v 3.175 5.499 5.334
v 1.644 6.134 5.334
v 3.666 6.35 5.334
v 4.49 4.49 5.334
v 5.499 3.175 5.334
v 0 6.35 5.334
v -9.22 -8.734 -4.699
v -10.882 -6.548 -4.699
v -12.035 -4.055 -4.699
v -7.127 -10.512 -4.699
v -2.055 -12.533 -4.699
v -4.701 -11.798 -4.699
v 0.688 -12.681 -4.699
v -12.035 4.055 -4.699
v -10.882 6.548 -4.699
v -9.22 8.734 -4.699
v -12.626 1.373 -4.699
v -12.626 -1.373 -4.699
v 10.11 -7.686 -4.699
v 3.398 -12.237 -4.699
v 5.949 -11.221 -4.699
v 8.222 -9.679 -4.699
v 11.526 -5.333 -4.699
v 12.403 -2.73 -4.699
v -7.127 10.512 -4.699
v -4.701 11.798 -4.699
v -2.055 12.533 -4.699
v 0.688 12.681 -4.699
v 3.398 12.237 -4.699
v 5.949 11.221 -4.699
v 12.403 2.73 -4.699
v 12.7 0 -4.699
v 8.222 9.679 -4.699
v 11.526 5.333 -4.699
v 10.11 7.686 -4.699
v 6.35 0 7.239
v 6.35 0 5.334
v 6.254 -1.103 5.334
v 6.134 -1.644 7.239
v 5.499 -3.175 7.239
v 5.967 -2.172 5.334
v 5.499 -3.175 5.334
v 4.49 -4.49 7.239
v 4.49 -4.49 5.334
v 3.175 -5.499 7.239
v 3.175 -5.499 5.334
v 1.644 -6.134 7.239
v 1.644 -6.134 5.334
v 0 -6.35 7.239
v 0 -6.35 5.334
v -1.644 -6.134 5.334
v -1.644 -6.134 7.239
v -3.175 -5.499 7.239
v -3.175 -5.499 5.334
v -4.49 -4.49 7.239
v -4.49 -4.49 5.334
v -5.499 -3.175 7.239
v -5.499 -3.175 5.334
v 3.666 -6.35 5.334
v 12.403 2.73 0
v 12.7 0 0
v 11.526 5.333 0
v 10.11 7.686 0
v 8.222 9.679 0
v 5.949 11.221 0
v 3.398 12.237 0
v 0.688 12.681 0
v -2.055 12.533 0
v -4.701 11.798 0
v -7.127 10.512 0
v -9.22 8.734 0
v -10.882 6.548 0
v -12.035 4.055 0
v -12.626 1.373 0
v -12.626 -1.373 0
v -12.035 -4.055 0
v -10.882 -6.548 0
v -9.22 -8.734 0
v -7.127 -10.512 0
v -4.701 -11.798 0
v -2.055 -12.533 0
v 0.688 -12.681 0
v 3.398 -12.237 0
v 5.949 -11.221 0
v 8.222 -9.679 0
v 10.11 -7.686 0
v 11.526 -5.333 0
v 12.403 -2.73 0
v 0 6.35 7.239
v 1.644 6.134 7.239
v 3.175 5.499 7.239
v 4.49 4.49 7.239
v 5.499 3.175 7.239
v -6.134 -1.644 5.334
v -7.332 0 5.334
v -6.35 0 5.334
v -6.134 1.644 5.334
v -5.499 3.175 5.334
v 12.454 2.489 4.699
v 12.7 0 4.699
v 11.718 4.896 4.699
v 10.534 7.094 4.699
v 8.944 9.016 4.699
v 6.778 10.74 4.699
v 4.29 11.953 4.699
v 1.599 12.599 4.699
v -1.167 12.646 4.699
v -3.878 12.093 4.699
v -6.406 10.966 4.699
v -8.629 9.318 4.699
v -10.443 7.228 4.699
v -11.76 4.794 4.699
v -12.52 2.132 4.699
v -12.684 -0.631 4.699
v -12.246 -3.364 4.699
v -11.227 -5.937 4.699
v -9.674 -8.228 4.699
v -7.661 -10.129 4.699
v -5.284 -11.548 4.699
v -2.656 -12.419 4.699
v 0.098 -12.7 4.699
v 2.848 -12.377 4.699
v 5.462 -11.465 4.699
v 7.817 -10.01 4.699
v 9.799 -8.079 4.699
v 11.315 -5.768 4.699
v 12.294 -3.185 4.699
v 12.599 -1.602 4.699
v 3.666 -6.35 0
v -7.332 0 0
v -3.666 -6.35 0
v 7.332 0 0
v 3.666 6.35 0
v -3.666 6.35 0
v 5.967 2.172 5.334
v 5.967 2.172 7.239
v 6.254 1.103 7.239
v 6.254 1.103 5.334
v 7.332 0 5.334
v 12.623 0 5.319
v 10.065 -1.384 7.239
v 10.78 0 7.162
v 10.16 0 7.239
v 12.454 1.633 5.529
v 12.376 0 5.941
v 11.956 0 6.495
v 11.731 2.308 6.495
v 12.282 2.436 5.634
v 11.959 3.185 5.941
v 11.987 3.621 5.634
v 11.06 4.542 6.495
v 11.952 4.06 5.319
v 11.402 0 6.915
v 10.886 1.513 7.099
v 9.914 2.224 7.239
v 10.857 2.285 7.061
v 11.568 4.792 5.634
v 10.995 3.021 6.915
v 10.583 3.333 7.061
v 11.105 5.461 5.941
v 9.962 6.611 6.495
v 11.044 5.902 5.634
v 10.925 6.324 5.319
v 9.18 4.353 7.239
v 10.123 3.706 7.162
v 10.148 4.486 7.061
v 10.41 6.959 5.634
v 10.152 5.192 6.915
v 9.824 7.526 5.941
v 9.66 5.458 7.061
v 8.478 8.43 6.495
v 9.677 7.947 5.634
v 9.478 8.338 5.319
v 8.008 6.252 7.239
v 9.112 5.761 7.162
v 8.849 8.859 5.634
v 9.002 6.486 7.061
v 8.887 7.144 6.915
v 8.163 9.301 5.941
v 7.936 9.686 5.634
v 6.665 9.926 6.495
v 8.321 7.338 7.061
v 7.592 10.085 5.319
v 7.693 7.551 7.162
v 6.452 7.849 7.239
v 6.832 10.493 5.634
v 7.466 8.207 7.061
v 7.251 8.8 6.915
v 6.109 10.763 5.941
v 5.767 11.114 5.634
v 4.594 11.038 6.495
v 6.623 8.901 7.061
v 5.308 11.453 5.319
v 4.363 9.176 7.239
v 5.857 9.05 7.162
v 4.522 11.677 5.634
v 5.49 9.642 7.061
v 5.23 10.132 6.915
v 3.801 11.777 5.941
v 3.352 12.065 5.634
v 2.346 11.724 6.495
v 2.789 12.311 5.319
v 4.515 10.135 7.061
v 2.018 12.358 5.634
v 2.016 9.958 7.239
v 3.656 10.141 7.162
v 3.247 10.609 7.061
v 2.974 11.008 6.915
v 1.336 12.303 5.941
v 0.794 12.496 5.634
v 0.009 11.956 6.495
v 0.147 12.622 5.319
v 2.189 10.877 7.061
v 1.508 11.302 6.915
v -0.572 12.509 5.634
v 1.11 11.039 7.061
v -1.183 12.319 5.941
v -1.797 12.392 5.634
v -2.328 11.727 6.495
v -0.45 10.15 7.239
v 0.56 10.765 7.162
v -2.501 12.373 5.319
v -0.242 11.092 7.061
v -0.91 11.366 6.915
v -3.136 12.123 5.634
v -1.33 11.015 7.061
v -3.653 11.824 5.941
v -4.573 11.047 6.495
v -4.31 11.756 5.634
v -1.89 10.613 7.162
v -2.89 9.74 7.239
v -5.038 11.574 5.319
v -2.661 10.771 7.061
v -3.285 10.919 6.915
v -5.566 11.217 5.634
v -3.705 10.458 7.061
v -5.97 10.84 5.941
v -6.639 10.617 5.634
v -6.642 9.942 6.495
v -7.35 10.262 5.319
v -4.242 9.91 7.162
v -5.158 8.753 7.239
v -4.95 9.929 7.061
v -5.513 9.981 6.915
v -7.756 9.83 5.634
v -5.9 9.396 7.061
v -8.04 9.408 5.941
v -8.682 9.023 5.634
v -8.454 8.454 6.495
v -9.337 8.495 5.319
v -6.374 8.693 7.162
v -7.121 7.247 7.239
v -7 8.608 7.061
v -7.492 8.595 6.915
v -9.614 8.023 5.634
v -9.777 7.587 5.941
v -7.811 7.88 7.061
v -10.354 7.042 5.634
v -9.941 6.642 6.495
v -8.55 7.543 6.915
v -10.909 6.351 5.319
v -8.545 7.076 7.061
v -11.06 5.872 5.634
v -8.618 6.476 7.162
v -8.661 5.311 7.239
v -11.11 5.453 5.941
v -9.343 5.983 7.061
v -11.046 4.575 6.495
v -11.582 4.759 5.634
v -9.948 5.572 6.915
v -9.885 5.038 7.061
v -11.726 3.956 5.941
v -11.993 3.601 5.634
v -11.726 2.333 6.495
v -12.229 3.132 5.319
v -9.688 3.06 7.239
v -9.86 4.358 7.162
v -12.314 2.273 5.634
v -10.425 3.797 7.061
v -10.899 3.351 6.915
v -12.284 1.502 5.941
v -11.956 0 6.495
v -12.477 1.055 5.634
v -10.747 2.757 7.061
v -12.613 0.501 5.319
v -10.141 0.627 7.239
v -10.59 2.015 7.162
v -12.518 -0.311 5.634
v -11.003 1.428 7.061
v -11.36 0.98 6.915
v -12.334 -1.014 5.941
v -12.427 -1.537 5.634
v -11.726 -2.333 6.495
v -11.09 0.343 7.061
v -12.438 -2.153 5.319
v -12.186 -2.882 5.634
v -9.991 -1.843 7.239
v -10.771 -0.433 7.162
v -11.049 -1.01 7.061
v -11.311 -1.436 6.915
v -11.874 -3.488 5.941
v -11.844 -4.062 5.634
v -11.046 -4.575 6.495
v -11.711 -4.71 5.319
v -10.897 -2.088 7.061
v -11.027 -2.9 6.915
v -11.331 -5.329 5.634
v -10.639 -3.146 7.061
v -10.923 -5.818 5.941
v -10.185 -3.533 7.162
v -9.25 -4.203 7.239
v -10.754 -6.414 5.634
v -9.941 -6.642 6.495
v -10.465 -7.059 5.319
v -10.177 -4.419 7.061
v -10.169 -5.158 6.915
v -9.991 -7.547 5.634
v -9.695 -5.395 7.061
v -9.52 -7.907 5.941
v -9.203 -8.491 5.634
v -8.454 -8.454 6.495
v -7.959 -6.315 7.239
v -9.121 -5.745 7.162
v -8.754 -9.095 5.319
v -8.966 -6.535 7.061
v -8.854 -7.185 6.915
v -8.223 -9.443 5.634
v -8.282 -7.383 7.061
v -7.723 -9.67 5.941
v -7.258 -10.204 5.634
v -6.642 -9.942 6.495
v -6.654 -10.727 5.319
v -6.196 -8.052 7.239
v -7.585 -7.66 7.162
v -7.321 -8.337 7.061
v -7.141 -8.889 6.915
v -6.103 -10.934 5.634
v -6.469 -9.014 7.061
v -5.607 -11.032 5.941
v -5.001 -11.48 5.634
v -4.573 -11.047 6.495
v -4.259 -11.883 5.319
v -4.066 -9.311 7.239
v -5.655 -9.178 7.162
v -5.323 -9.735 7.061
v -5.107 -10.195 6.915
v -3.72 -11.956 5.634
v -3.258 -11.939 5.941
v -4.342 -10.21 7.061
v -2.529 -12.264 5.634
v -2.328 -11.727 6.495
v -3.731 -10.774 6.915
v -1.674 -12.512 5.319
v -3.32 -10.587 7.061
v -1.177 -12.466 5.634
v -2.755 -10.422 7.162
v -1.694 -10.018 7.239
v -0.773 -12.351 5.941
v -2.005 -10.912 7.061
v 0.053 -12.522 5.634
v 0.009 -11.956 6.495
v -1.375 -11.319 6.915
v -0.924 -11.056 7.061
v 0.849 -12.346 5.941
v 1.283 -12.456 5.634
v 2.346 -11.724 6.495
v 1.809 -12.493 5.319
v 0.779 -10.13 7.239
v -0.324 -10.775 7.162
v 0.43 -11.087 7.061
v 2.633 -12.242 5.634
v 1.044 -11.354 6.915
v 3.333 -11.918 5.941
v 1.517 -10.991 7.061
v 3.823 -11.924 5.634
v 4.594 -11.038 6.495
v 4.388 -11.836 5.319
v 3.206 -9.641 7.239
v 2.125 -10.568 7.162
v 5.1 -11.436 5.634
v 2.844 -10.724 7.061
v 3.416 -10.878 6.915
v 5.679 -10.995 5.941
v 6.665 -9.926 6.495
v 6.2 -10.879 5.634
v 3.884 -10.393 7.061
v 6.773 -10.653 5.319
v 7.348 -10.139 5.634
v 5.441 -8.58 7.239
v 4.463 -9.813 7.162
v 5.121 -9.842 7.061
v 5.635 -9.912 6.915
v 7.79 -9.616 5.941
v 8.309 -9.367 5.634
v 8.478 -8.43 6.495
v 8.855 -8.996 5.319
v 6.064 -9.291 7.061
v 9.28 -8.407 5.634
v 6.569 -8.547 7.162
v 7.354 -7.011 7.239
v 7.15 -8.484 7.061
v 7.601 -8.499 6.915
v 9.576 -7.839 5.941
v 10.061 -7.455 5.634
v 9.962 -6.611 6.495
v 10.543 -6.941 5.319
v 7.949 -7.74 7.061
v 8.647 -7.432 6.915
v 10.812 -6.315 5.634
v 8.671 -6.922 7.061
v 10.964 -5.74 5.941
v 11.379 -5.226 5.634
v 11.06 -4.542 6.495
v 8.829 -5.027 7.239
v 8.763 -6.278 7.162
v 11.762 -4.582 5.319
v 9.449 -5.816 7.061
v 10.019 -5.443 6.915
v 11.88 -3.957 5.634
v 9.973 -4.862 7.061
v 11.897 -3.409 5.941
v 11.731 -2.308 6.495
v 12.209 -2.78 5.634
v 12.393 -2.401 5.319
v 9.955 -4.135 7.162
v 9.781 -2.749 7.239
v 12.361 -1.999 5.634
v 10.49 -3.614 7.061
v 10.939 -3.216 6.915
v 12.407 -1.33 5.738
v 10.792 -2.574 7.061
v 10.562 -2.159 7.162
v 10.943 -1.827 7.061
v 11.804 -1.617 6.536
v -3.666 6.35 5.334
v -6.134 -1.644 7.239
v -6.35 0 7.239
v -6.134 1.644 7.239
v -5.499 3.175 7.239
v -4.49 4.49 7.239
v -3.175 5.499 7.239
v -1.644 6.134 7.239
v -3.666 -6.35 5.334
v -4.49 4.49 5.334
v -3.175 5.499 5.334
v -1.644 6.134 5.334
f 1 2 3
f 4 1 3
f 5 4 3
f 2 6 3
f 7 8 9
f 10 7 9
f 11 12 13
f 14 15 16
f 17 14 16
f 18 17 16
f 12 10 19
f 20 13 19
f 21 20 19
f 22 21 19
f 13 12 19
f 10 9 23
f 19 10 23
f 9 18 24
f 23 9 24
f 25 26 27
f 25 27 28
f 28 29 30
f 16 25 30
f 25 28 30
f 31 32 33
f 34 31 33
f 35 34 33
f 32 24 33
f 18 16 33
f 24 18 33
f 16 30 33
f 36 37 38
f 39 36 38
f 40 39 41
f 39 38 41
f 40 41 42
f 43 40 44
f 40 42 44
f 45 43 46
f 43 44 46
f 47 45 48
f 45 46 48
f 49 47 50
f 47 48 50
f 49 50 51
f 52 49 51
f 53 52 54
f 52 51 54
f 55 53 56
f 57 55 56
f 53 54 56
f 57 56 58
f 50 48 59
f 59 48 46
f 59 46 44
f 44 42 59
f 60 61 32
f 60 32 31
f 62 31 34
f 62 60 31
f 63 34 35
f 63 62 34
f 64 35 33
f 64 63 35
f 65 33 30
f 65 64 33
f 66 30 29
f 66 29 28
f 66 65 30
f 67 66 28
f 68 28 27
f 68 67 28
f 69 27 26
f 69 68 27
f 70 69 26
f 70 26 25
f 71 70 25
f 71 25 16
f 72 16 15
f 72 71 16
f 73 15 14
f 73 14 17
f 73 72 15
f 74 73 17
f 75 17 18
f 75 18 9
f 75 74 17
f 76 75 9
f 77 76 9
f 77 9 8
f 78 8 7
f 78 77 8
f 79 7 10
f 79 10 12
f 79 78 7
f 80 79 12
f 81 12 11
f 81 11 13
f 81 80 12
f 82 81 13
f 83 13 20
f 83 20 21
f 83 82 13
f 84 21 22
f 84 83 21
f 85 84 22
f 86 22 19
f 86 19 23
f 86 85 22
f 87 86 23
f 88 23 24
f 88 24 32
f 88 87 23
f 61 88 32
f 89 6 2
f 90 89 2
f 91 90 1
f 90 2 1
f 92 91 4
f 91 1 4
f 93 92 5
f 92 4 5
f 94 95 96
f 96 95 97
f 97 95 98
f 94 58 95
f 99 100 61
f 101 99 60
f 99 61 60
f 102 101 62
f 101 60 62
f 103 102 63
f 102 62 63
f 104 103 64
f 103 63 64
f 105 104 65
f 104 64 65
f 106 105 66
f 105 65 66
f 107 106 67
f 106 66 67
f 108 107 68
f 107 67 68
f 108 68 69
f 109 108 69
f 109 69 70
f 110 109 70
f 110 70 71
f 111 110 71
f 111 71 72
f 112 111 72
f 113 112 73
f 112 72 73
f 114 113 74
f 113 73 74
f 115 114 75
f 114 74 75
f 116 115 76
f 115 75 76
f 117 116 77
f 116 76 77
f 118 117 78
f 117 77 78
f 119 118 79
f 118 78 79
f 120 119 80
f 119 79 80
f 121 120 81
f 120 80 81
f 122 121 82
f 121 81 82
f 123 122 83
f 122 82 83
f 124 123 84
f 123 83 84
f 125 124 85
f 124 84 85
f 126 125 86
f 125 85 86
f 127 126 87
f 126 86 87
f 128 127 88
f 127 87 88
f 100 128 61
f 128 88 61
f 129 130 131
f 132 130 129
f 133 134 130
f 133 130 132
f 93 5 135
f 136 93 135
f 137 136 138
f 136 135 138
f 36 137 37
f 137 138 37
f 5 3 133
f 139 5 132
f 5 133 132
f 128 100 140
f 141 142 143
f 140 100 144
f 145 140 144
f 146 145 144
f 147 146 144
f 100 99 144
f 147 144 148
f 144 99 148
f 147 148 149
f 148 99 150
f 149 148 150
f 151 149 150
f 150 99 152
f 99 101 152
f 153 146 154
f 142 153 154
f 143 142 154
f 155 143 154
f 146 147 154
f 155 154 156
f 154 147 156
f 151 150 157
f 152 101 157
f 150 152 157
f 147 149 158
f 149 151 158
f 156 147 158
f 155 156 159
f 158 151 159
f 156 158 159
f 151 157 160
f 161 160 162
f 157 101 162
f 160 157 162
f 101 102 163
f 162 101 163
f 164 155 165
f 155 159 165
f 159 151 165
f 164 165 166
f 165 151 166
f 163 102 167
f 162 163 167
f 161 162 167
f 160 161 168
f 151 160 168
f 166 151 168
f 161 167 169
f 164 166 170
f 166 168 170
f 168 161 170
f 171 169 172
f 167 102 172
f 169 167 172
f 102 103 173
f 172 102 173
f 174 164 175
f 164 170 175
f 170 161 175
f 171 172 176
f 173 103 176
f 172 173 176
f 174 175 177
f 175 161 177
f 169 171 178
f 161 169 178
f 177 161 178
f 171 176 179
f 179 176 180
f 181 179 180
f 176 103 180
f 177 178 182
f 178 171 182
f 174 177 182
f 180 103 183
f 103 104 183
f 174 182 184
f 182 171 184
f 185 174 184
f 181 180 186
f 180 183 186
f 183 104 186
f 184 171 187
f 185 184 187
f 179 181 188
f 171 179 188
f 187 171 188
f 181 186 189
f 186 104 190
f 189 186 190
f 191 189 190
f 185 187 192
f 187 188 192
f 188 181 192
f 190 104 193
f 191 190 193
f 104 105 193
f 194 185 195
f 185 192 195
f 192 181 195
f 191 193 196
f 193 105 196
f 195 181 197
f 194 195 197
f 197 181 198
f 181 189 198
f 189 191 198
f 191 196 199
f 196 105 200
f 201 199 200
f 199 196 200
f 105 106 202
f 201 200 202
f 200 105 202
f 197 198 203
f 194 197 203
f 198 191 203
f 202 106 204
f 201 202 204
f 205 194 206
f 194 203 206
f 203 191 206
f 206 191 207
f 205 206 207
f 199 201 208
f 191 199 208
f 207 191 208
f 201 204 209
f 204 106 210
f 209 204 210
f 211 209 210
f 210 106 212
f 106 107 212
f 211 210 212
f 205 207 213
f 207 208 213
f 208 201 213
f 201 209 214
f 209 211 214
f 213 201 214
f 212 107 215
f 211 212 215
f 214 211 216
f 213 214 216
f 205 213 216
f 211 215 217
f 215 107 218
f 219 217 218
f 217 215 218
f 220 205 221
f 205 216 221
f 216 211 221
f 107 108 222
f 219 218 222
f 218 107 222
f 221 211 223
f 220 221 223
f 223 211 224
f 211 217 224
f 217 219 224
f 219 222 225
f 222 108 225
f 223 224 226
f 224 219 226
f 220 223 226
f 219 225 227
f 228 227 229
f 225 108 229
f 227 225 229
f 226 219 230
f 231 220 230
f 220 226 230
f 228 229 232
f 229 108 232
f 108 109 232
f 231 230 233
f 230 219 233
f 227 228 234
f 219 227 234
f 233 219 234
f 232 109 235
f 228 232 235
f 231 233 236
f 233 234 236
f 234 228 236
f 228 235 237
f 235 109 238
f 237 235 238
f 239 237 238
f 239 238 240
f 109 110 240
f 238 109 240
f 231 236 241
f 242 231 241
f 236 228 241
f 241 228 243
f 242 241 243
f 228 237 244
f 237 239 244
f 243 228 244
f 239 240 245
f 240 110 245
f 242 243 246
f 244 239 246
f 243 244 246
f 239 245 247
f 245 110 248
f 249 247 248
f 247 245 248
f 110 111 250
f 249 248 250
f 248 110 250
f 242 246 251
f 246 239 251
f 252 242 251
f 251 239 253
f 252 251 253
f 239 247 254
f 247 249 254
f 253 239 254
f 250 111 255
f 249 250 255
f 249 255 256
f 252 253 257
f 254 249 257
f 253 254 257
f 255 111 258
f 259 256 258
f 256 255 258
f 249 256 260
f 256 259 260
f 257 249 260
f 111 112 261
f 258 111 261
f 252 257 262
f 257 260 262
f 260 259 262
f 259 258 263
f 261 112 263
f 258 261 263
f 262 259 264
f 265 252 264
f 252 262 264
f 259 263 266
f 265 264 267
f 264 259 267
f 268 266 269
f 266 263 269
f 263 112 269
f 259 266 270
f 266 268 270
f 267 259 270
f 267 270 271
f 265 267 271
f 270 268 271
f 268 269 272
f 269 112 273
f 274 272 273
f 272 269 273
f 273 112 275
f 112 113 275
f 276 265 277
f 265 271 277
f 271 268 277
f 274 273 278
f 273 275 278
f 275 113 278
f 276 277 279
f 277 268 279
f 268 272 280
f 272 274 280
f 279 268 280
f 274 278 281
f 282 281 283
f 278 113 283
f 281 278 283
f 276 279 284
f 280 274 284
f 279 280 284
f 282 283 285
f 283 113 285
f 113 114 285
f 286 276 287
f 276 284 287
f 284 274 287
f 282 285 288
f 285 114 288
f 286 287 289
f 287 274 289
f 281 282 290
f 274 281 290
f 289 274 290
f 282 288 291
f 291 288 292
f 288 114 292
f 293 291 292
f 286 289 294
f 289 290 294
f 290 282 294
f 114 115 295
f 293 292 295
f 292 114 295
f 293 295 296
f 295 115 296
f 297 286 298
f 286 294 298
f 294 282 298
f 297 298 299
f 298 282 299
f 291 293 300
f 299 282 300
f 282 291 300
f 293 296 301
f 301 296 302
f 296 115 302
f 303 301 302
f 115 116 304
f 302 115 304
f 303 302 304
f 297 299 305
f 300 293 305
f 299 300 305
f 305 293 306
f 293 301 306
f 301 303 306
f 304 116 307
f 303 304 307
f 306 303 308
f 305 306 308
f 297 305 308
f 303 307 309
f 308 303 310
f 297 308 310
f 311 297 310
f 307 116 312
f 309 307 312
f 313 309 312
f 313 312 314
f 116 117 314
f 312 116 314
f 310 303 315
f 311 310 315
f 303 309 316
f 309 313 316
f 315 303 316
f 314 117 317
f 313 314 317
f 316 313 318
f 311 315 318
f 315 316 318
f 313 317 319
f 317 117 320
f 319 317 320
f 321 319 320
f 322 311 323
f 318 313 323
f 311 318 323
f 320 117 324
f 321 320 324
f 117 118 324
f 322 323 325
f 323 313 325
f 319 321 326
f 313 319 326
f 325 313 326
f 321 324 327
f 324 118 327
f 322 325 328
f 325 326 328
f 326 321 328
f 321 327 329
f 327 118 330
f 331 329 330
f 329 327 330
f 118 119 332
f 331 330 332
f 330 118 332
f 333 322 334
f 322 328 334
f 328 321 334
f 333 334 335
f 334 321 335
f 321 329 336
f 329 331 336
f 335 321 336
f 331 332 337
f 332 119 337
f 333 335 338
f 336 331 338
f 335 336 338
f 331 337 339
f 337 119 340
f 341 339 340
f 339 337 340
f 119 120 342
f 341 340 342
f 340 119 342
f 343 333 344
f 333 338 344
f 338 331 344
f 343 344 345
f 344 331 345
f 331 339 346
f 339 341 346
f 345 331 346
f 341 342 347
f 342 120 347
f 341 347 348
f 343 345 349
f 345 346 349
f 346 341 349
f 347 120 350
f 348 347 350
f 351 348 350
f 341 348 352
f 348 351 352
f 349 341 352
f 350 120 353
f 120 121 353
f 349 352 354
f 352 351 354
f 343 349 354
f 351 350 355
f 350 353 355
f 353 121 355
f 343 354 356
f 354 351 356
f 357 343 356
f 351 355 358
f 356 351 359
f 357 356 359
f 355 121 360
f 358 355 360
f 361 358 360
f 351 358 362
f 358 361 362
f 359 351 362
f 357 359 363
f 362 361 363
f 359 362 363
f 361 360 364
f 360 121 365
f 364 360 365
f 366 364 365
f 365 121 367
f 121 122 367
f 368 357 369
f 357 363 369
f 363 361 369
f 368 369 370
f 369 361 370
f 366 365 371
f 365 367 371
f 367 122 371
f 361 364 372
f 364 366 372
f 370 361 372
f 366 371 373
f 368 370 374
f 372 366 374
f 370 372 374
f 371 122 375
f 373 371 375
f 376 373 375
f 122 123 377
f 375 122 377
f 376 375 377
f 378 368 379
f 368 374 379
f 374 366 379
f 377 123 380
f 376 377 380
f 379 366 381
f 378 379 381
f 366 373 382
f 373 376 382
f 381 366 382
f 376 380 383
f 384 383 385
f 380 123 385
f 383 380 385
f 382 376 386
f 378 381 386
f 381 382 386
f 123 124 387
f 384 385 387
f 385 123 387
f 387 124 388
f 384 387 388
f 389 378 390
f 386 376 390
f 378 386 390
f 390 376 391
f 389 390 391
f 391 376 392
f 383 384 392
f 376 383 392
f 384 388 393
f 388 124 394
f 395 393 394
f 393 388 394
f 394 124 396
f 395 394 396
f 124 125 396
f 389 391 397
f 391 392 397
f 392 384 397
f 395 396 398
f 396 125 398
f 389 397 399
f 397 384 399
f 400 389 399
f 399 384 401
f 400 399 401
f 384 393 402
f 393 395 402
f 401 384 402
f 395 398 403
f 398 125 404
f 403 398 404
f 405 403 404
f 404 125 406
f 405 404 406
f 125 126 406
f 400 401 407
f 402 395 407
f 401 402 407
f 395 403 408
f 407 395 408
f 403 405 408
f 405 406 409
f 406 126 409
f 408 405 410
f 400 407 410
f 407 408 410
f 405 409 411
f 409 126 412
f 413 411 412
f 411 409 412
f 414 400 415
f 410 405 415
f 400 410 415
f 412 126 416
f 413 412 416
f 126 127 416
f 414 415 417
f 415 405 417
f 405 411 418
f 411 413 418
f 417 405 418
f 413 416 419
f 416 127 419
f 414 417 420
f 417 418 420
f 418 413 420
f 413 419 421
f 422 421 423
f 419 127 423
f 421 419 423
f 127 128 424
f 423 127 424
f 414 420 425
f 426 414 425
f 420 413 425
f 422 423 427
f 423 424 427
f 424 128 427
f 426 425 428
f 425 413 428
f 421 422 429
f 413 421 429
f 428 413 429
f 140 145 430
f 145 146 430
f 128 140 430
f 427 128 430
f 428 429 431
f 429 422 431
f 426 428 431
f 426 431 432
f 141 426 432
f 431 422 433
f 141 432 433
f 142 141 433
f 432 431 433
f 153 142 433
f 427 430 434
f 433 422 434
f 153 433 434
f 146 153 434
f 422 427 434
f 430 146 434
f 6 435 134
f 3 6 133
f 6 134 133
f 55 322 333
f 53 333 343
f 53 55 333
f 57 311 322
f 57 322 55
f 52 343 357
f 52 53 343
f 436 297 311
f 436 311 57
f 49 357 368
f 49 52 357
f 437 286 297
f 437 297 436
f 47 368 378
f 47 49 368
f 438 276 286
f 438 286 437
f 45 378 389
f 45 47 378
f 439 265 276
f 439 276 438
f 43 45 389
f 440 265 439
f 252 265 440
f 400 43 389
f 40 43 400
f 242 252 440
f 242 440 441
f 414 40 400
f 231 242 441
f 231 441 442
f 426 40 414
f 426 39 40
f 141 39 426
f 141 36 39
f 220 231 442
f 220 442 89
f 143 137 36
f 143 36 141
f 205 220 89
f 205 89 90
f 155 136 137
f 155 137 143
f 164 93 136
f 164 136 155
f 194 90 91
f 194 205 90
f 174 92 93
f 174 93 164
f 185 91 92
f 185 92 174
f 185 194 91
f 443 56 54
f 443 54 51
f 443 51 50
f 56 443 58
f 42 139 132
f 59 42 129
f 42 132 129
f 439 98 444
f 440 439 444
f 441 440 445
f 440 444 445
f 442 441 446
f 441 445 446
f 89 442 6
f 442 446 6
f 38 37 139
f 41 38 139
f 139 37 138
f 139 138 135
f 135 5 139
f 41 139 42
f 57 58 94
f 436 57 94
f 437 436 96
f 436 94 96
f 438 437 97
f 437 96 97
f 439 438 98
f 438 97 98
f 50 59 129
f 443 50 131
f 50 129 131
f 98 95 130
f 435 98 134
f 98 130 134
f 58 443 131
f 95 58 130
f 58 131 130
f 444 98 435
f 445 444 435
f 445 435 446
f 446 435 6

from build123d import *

# Parameters (mm, degrees)
F0_R     = 12.7
F1_DEPTH = 4.699
F2_DEPTH = 5.334
F3_R     = 12.7
F4_DEPTH = 1.905
F5_R     = 2.54


with BuildPart() as f1:
    # F0 (on Top) → F1 (new body)
    with BuildSketch(Plane.XY):
        Circle(F0_R)
        Polygon((-3.6661742094, 6.35), (3.6661742094, 6.35), (7.3323484187, 0), (3.6661742094, -6.35), (-3.6661742094, -6.35), (-7.3323484187, 0), align=None, mode=Mode.SUBTRACT)
        Polygon((7.3323484187, 0), (3.6661742094, 6.35), (-3.6661742094, 6.35), (-7.3323484187, 0), (-3.6661742094, -6.35), (3.6661742094, -6.35), align=None)
    extrude(amount=-F1_DEPTH)

    # F0 (on Top) → F2 (join)
    with BuildSketch(Plane.XY):
        Circle(F0_R)
        Polygon((-3.6661742094, 6.35), (3.6661742094, 6.35), (7.3323484187, 0), (3.6661742094, -6.35), (-3.6661742094, -6.35), (-7.3323484187, 0), align=None, mode=Mode.SUBTRACT)
    extrude(amount=F2_DEPTH)

    # F3 (on face) → F4 (join)
    with BuildSketch(Plane.XY.offset(5.334)):
        Circle(F3_R)
        Polygon((3.6661742094, 6.35), (5.4992612609, 3.175000092), (7.3323484187, 0), (5.4992613458, -3.174999945), (3.6661742094, -6.35), (0, -6.35), (-3.6661742094, -6.35), (-5.4992613297, -3.1749999728), (-7.3323484187, 0), (-5.4992612781, 3.1750000622), (-3.6661742094, 6.35), (0, 6.35), align=None, mode=Mode.SUBTRACT)
        with BuildLine():
            ThreePointArc((-5.4992612781, 3.1750000622), (-3.1749999689, 5.499261332), (0, 6.35))
            Line((0, 6.35), (-3.6661742094, 6.35))
            Line((-3.6661742094, 6.35), (-5.4992612781, 3.1750000622))
        make_face()
        with BuildLine():
            ThreePointArc((0, 6.35), (3.174999954, 5.4992613406), (5.4992612609, 3.175000092))
            Line((5.4992612609, 3.175000092), (3.6661742094, 6.35))
            Line((3.6661742094, 6.35), (0, 6.35))
        make_face()
        with BuildLine():
            ThreePointArc((5.4992612609, 3.175000092), (6.1336289832, 1.6435009877), (6.35, 0))
            ThreePointArc((6.35, 0), (6.1336290052, -1.6435009057), (5.4992613458, -3.174999945))
            Line((5.4992613458, -3.174999945), (7.3323484187, 0))
            Line((7.3323484187, 0), (5.4992612609, 3.175000092))
        make_face()
        with BuildLine():
            Line((3.6661742094, -6.35), (5.4992613458, -3.174999945))
            ThreePointArc((5.4992613458, -3.174999945), (3.1750000275, -5.4992612981), (0, -6.35))
            Line((0, -6.35), (3.6661742094, -6.35))
        make_face()
        with BuildLine():
            Line((-3.6661742094, -6.35), (0, -6.35))
            ThreePointArc((0, -6.35), (-3.1750000136, -5.4992613062), (-5.4992613297, -3.1749999728))
            Line((-5.4992613297, -3.1749999728), (-3.6661742094, -6.35))
        make_face()
        with BuildLine():
            ThreePointArc((-5.4992613297, -3.1749999728), (-6.35, 5.16e-08), (-5.4992612781, 3.1750000622))
            Line((-5.4992612781, 3.1750000622), (-7.3323484187, 0))
            Line((-7.3323484187, 0), (-5.4992613297, -3.1749999728))
        make_face()
    extrude(amount=F4_DEPTH)

    # F5
    f5_edges = [f1.edges().sort_by_distance(p)[0] for p in [
        (-12.7, 0, 7.239),
    ]]
    fillet(f5_edges, radius=F5_R)


solid = f1.part
